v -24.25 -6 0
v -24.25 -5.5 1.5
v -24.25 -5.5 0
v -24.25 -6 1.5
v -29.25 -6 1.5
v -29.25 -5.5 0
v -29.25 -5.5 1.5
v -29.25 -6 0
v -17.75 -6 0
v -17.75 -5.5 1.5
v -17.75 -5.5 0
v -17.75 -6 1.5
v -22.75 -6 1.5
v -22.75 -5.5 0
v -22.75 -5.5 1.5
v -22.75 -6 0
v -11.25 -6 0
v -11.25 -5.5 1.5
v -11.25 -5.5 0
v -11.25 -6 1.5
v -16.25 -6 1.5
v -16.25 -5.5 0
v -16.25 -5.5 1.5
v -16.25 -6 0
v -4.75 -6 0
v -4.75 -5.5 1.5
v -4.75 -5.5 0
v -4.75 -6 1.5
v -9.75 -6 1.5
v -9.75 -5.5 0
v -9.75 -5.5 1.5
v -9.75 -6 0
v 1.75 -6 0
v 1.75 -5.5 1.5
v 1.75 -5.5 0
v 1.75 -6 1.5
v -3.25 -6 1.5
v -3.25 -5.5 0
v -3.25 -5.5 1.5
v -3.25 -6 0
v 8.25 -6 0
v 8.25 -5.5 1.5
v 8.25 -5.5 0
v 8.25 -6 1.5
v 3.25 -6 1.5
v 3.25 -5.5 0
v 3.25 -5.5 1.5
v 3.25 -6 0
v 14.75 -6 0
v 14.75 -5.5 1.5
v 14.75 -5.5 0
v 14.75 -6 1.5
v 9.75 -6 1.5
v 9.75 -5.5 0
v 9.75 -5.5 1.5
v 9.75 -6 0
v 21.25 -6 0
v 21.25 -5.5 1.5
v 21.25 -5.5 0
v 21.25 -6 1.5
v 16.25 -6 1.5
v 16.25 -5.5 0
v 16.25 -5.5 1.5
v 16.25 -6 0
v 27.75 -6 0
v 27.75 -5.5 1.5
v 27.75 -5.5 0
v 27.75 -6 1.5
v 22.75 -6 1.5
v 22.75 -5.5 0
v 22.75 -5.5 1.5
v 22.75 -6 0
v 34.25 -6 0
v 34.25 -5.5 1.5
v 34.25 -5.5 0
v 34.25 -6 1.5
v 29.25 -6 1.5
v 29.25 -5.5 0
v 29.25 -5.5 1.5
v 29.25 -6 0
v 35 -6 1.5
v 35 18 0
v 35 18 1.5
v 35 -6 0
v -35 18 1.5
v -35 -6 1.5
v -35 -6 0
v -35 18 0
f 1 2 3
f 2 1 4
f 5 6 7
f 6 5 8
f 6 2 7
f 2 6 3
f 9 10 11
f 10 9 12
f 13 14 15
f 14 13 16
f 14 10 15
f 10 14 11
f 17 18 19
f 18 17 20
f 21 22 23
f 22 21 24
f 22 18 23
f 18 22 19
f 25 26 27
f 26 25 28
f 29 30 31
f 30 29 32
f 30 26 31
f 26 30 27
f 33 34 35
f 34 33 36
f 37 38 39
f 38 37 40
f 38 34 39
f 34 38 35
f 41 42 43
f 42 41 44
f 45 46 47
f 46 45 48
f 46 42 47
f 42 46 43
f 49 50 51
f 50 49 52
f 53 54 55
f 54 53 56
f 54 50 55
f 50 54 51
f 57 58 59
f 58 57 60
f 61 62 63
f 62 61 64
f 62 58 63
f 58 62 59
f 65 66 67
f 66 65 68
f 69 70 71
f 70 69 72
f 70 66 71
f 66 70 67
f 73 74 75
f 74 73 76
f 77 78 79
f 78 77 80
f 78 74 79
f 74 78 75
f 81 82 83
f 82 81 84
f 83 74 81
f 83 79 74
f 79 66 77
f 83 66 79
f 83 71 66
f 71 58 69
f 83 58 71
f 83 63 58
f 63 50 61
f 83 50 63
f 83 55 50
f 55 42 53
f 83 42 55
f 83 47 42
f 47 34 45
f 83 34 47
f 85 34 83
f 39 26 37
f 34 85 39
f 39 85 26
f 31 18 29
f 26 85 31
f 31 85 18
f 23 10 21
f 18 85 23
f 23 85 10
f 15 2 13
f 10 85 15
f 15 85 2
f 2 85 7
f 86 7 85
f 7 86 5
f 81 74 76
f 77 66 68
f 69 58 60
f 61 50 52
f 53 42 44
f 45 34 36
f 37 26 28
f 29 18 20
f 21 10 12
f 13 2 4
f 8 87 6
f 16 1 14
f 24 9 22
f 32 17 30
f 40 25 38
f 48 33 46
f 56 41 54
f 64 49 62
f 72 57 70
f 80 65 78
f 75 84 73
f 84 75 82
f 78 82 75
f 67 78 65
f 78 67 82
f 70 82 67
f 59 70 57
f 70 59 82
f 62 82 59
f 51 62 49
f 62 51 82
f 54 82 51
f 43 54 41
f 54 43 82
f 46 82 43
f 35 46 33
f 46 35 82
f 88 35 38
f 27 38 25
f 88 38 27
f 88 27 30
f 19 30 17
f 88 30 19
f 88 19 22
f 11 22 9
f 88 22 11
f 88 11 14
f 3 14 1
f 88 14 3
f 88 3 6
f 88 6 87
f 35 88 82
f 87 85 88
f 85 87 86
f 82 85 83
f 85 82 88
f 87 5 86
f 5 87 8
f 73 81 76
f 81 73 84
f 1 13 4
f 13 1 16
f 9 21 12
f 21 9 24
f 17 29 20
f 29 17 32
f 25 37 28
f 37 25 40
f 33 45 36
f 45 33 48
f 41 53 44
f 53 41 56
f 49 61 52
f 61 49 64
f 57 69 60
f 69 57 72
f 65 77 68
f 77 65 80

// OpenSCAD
// 10-well agarose gel comb, printed lying flat
// Units: mm

// ---- Spine ----
spine_len   = 70;    // spine length along X
spine_wid   = 12;    // spine width along Y
plate_thk   = 1.5;   // plate thickness (Z)

// ---- Teeth ----
tooth_count = 10;    // number of wells
tooth_w     = 5.0;   // tooth width along X
tooth_l     = 12;    // tooth length along Y (from top edge of spine)
gap         = 1.5;   // gap between neighbouring teeth

// ---- Misc ----
eps         = 0.5;   // cutter overshoot past faces
$fn         = 64;

// Derived
pitch       = tooth_w + gap;                 // centre-to-centre spacing
row_span    = (tooth_count - 1) * gap;       // total gap width
x_start     = -(pitch * (tooth_count - 1)) / 2 + tooth_w / 2; // first tooth centre X

difference() {
    // Base plate (spine + teeth area)
    translate([-spine_len / 2, -spine_wid / 2, 0])
        cube([spine_len, spine_wid + tooth_l, plate_thk]);

    // Cut out the teeth (leaving the spine intact)
    for (i = [0 : tooth_count - 1])
        translate([x_start + i * pitch - tooth_w / 2,
                   -spine_wid / 2 - tooth_l,
                   -eps])
            cube([tooth_w, tooth_l + eps, plate_thk + 2 * eps]);
}
